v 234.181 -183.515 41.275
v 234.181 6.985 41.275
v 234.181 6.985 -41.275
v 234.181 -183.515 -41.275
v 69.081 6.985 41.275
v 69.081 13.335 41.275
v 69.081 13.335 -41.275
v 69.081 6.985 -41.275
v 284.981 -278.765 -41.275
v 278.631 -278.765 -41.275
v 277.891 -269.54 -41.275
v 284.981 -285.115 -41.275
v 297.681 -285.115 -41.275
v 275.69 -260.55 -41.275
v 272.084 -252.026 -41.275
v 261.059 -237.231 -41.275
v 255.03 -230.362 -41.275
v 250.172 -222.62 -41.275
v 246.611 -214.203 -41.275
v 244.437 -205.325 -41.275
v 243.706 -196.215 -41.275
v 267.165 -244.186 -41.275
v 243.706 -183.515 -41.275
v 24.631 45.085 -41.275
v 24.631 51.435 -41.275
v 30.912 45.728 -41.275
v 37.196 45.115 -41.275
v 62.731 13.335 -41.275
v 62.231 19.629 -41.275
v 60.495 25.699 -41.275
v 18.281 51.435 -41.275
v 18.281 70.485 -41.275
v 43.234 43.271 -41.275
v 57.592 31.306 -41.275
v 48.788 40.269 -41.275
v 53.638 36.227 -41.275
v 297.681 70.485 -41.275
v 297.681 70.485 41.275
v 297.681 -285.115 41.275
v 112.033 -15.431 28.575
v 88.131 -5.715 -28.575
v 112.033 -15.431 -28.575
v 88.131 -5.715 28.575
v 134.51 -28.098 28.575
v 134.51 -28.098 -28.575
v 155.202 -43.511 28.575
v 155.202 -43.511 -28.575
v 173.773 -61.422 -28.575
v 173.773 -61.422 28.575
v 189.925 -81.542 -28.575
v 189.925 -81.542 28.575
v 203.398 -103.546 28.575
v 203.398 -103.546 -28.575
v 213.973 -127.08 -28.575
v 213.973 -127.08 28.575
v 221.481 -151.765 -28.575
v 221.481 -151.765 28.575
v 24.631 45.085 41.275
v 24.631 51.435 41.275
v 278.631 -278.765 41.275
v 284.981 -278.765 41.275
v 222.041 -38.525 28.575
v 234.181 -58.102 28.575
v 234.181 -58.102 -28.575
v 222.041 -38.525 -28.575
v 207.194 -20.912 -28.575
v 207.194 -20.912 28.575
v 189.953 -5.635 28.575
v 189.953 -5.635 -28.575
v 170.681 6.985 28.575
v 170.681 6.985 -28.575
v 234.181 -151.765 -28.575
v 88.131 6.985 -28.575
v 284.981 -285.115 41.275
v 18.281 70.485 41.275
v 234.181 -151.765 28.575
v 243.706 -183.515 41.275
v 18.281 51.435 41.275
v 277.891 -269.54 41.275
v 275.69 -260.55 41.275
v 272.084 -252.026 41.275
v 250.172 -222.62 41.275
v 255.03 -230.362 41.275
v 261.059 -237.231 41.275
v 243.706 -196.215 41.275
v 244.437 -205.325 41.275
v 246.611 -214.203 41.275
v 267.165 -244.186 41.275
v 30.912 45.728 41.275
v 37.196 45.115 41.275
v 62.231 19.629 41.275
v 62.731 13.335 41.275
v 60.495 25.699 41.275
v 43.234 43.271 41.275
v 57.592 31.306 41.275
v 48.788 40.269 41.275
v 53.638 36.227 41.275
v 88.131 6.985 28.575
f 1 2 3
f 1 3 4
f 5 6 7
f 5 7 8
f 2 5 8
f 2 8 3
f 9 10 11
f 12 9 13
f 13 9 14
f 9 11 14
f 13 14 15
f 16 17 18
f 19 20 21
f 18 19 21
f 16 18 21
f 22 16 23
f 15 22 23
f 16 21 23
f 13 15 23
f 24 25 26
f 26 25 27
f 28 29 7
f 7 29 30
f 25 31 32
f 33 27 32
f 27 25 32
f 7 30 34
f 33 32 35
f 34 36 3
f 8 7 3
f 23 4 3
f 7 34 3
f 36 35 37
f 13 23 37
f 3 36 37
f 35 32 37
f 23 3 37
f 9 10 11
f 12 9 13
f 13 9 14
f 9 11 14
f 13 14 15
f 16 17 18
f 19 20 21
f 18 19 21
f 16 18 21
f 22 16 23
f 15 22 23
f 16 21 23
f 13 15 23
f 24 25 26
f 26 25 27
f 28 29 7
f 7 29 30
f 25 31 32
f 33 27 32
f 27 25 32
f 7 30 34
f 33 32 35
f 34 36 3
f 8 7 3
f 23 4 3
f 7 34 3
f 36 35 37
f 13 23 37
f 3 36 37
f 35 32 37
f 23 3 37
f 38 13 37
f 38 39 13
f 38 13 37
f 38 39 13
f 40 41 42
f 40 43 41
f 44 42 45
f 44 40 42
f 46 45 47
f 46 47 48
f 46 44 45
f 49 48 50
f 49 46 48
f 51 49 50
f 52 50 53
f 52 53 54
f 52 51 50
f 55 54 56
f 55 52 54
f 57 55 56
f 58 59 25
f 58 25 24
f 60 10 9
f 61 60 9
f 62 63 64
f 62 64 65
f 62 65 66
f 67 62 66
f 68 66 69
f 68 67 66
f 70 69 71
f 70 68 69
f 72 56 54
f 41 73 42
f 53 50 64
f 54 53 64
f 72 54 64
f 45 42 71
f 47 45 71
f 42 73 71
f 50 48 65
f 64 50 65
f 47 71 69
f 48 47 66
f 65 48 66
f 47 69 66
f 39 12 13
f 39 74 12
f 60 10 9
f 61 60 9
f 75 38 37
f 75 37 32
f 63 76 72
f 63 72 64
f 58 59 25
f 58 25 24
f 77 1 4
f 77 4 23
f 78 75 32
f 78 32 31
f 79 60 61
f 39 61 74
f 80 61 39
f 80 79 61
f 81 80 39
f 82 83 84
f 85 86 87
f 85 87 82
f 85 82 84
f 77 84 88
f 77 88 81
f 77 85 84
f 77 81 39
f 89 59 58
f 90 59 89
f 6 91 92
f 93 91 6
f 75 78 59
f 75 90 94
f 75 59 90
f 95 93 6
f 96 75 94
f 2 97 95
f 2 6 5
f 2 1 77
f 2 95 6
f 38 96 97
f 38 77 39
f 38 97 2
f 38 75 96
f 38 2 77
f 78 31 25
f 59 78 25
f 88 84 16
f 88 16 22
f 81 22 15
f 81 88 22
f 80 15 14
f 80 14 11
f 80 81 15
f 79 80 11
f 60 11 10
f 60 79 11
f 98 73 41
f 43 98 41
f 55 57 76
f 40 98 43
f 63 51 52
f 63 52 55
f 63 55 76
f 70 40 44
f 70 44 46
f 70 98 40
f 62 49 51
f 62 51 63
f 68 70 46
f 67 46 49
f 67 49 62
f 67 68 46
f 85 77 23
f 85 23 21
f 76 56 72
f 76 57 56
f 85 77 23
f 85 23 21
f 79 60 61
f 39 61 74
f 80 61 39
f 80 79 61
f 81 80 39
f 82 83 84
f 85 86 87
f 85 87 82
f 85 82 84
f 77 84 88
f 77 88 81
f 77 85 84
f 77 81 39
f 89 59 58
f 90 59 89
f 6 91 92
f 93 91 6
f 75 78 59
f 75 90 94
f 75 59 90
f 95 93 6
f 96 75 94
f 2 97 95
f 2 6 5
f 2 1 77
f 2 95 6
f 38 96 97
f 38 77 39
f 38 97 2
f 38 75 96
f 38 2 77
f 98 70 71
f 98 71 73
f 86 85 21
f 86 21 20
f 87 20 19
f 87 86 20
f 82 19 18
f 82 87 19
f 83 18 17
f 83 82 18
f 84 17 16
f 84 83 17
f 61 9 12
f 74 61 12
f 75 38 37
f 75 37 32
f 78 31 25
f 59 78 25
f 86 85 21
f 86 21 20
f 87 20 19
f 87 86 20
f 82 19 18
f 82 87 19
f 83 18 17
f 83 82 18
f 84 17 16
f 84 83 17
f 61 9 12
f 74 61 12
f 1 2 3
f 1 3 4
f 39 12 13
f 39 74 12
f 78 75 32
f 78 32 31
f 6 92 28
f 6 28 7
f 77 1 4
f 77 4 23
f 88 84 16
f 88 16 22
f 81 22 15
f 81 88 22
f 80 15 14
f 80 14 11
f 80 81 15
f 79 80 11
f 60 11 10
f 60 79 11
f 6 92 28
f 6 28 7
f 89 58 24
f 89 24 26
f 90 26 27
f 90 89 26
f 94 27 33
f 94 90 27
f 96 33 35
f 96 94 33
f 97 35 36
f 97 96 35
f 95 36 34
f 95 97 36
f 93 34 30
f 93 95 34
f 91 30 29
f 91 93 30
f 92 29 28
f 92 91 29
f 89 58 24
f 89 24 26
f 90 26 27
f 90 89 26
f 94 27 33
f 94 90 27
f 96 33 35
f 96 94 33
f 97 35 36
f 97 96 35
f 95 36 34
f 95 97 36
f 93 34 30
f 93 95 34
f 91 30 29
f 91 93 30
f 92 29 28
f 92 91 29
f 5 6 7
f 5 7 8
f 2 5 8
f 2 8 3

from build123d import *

# Parameters (mm, degrees)
BOSS_EXTRUDE1_DEPTH = 41.275
BOSS_EXTRUDE2_DEPTH = 28.575
BOSS_EXTRUDE3_DEPTH = 41.275


with BuildPart() as part:
    # Sketch1 → Boss-Extrude1 (new body, symmetric)
    with BuildSketch(Plane.XY):
        with BuildLine():
            Line((297.681223016, -285.115), (297.681223016, 70.485))
            Line((297.681223016, 70.485), (18.281223016, 70.485))
            Line((18.281223016, 70.485), (18.281223016, 51.435))
            Line((18.281223016, 51.435), (24.631223016, 51.435))
            Line((24.631223016, 51.435), (24.631223016, 45.085))
            ThreePointArc((24.631223016, 45.085), (51.31358552, 38.368835005), (62.731223016, 13.335))
            Line((62.731223016, 13.335), (69.081223016, 13.335))
            Line((69.081223016, 13.335), (69.081223016, 6.985))
            Line((69.081223016, 6.985), (234.181223016, 6.985))
            Line((234.181223016, 6.985), (234.181223016, -183.515))
            Line((234.181223016, -183.515), (243.706223016, -183.515))
            Line((243.706223016, -183.515), (243.706223016, -196.215))
            ThreePointArc((243.706223016, -196.215), (248.222944617, -218.482925476), (261.059171573, -237.231060226))
            ThreePointArc((261.059171573, -237.231060226), (274.057472101, -256.215913848), (278.631223016, -278.765))
            Line((278.631223016, -278.765), (284.981223016, -278.765))
            Line((284.981223016, -278.765), (284.981223016, -285.115))
            Line((284.981223016, -285.115), (297.681223016, -285.115))
        make_face()
    extrude(amount=BOSS_EXTRUDE1_DEPTH, both=True)


with BuildPart() as body_2:
    # Sketch1_3 → Boss-Extrude2 (new body, symmetric)
    with BuildSketch(Plane.XY):
        with BuildLine():
            Line((221.481223016, -151.765), (234.181223016, -151.765))
            Line((234.181223016, -151.765), (234.181223016, -58.1025))
            ThreePointArc((234.181223016, -58.1025), (207.193723016, -20.912408537), (170.681223016, 6.985))
            Line((170.681223016, 6.985), (88.131223016, 6.985))
            Line((88.131223016, 6.985), (88.131223016, -5.715))
            ThreePointArc((88.131223016, -5.715), (173.773269169, -61.422262208), (221.481223016, -151.765))
        make_face()
    extrude(amount=BOSS_EXTRUDE2_DEPTH, both=True)


with BuildPart() as body_3:
    # Sketch1_4 → Boss-Extrude3 (new body, symmetric)
    with BuildSketch(Plane.XY):
        with BuildLine():
            Line((297.681223016, -285.115), (297.681223016, 70.485))
            Line((297.681223016, 70.485), (18.281223016, 70.485))
            Line((18.281223016, 70.485), (18.281223016, 51.435))
            Line((18.281223016, 51.435), (24.631223016, 51.435))
            Line((24.631223016, 51.435), (24.631223016, 45.085))
            ThreePointArc((24.631223016, 45.085), (51.31358552, 38.368835005), (62.731223016, 13.335))
            Line((62.731223016, 13.335), (69.081223016, 13.335))
            Line((69.081223016, 13.335), (69.081223016, 6.985))
            Line((69.081223016, 6.985), (234.181223016, 6.985))
            Line((234.181223016, 6.985), (234.181223016, -183.515))
            Line((234.181223016, -183.515), (243.706223016, -183.515))
            Line((243.706223016, -183.515), (243.706223016, -196.215))
            ThreePointArc((243.706223016, -196.215), (248.222944617, -218.482925476), (261.059171573, -237.231060226))
            ThreePointArc((261.059171573, -237.231060226), (274.057472101, -256.215913848), (278.631223016, -278.765))
            Line((278.631223016, -278.765), (284.981223016, -278.765))
            Line((284.981223016, -278.765), (284.981223016, -285.115))
            Line((284.981223016, -285.115), (297.681223016, -285.115))
        make_face()
    extrude(amount=BOSS_EXTRUDE3_DEPTH, both=True)


solid = Compound([part.part, body_2.part, body_3.part])
